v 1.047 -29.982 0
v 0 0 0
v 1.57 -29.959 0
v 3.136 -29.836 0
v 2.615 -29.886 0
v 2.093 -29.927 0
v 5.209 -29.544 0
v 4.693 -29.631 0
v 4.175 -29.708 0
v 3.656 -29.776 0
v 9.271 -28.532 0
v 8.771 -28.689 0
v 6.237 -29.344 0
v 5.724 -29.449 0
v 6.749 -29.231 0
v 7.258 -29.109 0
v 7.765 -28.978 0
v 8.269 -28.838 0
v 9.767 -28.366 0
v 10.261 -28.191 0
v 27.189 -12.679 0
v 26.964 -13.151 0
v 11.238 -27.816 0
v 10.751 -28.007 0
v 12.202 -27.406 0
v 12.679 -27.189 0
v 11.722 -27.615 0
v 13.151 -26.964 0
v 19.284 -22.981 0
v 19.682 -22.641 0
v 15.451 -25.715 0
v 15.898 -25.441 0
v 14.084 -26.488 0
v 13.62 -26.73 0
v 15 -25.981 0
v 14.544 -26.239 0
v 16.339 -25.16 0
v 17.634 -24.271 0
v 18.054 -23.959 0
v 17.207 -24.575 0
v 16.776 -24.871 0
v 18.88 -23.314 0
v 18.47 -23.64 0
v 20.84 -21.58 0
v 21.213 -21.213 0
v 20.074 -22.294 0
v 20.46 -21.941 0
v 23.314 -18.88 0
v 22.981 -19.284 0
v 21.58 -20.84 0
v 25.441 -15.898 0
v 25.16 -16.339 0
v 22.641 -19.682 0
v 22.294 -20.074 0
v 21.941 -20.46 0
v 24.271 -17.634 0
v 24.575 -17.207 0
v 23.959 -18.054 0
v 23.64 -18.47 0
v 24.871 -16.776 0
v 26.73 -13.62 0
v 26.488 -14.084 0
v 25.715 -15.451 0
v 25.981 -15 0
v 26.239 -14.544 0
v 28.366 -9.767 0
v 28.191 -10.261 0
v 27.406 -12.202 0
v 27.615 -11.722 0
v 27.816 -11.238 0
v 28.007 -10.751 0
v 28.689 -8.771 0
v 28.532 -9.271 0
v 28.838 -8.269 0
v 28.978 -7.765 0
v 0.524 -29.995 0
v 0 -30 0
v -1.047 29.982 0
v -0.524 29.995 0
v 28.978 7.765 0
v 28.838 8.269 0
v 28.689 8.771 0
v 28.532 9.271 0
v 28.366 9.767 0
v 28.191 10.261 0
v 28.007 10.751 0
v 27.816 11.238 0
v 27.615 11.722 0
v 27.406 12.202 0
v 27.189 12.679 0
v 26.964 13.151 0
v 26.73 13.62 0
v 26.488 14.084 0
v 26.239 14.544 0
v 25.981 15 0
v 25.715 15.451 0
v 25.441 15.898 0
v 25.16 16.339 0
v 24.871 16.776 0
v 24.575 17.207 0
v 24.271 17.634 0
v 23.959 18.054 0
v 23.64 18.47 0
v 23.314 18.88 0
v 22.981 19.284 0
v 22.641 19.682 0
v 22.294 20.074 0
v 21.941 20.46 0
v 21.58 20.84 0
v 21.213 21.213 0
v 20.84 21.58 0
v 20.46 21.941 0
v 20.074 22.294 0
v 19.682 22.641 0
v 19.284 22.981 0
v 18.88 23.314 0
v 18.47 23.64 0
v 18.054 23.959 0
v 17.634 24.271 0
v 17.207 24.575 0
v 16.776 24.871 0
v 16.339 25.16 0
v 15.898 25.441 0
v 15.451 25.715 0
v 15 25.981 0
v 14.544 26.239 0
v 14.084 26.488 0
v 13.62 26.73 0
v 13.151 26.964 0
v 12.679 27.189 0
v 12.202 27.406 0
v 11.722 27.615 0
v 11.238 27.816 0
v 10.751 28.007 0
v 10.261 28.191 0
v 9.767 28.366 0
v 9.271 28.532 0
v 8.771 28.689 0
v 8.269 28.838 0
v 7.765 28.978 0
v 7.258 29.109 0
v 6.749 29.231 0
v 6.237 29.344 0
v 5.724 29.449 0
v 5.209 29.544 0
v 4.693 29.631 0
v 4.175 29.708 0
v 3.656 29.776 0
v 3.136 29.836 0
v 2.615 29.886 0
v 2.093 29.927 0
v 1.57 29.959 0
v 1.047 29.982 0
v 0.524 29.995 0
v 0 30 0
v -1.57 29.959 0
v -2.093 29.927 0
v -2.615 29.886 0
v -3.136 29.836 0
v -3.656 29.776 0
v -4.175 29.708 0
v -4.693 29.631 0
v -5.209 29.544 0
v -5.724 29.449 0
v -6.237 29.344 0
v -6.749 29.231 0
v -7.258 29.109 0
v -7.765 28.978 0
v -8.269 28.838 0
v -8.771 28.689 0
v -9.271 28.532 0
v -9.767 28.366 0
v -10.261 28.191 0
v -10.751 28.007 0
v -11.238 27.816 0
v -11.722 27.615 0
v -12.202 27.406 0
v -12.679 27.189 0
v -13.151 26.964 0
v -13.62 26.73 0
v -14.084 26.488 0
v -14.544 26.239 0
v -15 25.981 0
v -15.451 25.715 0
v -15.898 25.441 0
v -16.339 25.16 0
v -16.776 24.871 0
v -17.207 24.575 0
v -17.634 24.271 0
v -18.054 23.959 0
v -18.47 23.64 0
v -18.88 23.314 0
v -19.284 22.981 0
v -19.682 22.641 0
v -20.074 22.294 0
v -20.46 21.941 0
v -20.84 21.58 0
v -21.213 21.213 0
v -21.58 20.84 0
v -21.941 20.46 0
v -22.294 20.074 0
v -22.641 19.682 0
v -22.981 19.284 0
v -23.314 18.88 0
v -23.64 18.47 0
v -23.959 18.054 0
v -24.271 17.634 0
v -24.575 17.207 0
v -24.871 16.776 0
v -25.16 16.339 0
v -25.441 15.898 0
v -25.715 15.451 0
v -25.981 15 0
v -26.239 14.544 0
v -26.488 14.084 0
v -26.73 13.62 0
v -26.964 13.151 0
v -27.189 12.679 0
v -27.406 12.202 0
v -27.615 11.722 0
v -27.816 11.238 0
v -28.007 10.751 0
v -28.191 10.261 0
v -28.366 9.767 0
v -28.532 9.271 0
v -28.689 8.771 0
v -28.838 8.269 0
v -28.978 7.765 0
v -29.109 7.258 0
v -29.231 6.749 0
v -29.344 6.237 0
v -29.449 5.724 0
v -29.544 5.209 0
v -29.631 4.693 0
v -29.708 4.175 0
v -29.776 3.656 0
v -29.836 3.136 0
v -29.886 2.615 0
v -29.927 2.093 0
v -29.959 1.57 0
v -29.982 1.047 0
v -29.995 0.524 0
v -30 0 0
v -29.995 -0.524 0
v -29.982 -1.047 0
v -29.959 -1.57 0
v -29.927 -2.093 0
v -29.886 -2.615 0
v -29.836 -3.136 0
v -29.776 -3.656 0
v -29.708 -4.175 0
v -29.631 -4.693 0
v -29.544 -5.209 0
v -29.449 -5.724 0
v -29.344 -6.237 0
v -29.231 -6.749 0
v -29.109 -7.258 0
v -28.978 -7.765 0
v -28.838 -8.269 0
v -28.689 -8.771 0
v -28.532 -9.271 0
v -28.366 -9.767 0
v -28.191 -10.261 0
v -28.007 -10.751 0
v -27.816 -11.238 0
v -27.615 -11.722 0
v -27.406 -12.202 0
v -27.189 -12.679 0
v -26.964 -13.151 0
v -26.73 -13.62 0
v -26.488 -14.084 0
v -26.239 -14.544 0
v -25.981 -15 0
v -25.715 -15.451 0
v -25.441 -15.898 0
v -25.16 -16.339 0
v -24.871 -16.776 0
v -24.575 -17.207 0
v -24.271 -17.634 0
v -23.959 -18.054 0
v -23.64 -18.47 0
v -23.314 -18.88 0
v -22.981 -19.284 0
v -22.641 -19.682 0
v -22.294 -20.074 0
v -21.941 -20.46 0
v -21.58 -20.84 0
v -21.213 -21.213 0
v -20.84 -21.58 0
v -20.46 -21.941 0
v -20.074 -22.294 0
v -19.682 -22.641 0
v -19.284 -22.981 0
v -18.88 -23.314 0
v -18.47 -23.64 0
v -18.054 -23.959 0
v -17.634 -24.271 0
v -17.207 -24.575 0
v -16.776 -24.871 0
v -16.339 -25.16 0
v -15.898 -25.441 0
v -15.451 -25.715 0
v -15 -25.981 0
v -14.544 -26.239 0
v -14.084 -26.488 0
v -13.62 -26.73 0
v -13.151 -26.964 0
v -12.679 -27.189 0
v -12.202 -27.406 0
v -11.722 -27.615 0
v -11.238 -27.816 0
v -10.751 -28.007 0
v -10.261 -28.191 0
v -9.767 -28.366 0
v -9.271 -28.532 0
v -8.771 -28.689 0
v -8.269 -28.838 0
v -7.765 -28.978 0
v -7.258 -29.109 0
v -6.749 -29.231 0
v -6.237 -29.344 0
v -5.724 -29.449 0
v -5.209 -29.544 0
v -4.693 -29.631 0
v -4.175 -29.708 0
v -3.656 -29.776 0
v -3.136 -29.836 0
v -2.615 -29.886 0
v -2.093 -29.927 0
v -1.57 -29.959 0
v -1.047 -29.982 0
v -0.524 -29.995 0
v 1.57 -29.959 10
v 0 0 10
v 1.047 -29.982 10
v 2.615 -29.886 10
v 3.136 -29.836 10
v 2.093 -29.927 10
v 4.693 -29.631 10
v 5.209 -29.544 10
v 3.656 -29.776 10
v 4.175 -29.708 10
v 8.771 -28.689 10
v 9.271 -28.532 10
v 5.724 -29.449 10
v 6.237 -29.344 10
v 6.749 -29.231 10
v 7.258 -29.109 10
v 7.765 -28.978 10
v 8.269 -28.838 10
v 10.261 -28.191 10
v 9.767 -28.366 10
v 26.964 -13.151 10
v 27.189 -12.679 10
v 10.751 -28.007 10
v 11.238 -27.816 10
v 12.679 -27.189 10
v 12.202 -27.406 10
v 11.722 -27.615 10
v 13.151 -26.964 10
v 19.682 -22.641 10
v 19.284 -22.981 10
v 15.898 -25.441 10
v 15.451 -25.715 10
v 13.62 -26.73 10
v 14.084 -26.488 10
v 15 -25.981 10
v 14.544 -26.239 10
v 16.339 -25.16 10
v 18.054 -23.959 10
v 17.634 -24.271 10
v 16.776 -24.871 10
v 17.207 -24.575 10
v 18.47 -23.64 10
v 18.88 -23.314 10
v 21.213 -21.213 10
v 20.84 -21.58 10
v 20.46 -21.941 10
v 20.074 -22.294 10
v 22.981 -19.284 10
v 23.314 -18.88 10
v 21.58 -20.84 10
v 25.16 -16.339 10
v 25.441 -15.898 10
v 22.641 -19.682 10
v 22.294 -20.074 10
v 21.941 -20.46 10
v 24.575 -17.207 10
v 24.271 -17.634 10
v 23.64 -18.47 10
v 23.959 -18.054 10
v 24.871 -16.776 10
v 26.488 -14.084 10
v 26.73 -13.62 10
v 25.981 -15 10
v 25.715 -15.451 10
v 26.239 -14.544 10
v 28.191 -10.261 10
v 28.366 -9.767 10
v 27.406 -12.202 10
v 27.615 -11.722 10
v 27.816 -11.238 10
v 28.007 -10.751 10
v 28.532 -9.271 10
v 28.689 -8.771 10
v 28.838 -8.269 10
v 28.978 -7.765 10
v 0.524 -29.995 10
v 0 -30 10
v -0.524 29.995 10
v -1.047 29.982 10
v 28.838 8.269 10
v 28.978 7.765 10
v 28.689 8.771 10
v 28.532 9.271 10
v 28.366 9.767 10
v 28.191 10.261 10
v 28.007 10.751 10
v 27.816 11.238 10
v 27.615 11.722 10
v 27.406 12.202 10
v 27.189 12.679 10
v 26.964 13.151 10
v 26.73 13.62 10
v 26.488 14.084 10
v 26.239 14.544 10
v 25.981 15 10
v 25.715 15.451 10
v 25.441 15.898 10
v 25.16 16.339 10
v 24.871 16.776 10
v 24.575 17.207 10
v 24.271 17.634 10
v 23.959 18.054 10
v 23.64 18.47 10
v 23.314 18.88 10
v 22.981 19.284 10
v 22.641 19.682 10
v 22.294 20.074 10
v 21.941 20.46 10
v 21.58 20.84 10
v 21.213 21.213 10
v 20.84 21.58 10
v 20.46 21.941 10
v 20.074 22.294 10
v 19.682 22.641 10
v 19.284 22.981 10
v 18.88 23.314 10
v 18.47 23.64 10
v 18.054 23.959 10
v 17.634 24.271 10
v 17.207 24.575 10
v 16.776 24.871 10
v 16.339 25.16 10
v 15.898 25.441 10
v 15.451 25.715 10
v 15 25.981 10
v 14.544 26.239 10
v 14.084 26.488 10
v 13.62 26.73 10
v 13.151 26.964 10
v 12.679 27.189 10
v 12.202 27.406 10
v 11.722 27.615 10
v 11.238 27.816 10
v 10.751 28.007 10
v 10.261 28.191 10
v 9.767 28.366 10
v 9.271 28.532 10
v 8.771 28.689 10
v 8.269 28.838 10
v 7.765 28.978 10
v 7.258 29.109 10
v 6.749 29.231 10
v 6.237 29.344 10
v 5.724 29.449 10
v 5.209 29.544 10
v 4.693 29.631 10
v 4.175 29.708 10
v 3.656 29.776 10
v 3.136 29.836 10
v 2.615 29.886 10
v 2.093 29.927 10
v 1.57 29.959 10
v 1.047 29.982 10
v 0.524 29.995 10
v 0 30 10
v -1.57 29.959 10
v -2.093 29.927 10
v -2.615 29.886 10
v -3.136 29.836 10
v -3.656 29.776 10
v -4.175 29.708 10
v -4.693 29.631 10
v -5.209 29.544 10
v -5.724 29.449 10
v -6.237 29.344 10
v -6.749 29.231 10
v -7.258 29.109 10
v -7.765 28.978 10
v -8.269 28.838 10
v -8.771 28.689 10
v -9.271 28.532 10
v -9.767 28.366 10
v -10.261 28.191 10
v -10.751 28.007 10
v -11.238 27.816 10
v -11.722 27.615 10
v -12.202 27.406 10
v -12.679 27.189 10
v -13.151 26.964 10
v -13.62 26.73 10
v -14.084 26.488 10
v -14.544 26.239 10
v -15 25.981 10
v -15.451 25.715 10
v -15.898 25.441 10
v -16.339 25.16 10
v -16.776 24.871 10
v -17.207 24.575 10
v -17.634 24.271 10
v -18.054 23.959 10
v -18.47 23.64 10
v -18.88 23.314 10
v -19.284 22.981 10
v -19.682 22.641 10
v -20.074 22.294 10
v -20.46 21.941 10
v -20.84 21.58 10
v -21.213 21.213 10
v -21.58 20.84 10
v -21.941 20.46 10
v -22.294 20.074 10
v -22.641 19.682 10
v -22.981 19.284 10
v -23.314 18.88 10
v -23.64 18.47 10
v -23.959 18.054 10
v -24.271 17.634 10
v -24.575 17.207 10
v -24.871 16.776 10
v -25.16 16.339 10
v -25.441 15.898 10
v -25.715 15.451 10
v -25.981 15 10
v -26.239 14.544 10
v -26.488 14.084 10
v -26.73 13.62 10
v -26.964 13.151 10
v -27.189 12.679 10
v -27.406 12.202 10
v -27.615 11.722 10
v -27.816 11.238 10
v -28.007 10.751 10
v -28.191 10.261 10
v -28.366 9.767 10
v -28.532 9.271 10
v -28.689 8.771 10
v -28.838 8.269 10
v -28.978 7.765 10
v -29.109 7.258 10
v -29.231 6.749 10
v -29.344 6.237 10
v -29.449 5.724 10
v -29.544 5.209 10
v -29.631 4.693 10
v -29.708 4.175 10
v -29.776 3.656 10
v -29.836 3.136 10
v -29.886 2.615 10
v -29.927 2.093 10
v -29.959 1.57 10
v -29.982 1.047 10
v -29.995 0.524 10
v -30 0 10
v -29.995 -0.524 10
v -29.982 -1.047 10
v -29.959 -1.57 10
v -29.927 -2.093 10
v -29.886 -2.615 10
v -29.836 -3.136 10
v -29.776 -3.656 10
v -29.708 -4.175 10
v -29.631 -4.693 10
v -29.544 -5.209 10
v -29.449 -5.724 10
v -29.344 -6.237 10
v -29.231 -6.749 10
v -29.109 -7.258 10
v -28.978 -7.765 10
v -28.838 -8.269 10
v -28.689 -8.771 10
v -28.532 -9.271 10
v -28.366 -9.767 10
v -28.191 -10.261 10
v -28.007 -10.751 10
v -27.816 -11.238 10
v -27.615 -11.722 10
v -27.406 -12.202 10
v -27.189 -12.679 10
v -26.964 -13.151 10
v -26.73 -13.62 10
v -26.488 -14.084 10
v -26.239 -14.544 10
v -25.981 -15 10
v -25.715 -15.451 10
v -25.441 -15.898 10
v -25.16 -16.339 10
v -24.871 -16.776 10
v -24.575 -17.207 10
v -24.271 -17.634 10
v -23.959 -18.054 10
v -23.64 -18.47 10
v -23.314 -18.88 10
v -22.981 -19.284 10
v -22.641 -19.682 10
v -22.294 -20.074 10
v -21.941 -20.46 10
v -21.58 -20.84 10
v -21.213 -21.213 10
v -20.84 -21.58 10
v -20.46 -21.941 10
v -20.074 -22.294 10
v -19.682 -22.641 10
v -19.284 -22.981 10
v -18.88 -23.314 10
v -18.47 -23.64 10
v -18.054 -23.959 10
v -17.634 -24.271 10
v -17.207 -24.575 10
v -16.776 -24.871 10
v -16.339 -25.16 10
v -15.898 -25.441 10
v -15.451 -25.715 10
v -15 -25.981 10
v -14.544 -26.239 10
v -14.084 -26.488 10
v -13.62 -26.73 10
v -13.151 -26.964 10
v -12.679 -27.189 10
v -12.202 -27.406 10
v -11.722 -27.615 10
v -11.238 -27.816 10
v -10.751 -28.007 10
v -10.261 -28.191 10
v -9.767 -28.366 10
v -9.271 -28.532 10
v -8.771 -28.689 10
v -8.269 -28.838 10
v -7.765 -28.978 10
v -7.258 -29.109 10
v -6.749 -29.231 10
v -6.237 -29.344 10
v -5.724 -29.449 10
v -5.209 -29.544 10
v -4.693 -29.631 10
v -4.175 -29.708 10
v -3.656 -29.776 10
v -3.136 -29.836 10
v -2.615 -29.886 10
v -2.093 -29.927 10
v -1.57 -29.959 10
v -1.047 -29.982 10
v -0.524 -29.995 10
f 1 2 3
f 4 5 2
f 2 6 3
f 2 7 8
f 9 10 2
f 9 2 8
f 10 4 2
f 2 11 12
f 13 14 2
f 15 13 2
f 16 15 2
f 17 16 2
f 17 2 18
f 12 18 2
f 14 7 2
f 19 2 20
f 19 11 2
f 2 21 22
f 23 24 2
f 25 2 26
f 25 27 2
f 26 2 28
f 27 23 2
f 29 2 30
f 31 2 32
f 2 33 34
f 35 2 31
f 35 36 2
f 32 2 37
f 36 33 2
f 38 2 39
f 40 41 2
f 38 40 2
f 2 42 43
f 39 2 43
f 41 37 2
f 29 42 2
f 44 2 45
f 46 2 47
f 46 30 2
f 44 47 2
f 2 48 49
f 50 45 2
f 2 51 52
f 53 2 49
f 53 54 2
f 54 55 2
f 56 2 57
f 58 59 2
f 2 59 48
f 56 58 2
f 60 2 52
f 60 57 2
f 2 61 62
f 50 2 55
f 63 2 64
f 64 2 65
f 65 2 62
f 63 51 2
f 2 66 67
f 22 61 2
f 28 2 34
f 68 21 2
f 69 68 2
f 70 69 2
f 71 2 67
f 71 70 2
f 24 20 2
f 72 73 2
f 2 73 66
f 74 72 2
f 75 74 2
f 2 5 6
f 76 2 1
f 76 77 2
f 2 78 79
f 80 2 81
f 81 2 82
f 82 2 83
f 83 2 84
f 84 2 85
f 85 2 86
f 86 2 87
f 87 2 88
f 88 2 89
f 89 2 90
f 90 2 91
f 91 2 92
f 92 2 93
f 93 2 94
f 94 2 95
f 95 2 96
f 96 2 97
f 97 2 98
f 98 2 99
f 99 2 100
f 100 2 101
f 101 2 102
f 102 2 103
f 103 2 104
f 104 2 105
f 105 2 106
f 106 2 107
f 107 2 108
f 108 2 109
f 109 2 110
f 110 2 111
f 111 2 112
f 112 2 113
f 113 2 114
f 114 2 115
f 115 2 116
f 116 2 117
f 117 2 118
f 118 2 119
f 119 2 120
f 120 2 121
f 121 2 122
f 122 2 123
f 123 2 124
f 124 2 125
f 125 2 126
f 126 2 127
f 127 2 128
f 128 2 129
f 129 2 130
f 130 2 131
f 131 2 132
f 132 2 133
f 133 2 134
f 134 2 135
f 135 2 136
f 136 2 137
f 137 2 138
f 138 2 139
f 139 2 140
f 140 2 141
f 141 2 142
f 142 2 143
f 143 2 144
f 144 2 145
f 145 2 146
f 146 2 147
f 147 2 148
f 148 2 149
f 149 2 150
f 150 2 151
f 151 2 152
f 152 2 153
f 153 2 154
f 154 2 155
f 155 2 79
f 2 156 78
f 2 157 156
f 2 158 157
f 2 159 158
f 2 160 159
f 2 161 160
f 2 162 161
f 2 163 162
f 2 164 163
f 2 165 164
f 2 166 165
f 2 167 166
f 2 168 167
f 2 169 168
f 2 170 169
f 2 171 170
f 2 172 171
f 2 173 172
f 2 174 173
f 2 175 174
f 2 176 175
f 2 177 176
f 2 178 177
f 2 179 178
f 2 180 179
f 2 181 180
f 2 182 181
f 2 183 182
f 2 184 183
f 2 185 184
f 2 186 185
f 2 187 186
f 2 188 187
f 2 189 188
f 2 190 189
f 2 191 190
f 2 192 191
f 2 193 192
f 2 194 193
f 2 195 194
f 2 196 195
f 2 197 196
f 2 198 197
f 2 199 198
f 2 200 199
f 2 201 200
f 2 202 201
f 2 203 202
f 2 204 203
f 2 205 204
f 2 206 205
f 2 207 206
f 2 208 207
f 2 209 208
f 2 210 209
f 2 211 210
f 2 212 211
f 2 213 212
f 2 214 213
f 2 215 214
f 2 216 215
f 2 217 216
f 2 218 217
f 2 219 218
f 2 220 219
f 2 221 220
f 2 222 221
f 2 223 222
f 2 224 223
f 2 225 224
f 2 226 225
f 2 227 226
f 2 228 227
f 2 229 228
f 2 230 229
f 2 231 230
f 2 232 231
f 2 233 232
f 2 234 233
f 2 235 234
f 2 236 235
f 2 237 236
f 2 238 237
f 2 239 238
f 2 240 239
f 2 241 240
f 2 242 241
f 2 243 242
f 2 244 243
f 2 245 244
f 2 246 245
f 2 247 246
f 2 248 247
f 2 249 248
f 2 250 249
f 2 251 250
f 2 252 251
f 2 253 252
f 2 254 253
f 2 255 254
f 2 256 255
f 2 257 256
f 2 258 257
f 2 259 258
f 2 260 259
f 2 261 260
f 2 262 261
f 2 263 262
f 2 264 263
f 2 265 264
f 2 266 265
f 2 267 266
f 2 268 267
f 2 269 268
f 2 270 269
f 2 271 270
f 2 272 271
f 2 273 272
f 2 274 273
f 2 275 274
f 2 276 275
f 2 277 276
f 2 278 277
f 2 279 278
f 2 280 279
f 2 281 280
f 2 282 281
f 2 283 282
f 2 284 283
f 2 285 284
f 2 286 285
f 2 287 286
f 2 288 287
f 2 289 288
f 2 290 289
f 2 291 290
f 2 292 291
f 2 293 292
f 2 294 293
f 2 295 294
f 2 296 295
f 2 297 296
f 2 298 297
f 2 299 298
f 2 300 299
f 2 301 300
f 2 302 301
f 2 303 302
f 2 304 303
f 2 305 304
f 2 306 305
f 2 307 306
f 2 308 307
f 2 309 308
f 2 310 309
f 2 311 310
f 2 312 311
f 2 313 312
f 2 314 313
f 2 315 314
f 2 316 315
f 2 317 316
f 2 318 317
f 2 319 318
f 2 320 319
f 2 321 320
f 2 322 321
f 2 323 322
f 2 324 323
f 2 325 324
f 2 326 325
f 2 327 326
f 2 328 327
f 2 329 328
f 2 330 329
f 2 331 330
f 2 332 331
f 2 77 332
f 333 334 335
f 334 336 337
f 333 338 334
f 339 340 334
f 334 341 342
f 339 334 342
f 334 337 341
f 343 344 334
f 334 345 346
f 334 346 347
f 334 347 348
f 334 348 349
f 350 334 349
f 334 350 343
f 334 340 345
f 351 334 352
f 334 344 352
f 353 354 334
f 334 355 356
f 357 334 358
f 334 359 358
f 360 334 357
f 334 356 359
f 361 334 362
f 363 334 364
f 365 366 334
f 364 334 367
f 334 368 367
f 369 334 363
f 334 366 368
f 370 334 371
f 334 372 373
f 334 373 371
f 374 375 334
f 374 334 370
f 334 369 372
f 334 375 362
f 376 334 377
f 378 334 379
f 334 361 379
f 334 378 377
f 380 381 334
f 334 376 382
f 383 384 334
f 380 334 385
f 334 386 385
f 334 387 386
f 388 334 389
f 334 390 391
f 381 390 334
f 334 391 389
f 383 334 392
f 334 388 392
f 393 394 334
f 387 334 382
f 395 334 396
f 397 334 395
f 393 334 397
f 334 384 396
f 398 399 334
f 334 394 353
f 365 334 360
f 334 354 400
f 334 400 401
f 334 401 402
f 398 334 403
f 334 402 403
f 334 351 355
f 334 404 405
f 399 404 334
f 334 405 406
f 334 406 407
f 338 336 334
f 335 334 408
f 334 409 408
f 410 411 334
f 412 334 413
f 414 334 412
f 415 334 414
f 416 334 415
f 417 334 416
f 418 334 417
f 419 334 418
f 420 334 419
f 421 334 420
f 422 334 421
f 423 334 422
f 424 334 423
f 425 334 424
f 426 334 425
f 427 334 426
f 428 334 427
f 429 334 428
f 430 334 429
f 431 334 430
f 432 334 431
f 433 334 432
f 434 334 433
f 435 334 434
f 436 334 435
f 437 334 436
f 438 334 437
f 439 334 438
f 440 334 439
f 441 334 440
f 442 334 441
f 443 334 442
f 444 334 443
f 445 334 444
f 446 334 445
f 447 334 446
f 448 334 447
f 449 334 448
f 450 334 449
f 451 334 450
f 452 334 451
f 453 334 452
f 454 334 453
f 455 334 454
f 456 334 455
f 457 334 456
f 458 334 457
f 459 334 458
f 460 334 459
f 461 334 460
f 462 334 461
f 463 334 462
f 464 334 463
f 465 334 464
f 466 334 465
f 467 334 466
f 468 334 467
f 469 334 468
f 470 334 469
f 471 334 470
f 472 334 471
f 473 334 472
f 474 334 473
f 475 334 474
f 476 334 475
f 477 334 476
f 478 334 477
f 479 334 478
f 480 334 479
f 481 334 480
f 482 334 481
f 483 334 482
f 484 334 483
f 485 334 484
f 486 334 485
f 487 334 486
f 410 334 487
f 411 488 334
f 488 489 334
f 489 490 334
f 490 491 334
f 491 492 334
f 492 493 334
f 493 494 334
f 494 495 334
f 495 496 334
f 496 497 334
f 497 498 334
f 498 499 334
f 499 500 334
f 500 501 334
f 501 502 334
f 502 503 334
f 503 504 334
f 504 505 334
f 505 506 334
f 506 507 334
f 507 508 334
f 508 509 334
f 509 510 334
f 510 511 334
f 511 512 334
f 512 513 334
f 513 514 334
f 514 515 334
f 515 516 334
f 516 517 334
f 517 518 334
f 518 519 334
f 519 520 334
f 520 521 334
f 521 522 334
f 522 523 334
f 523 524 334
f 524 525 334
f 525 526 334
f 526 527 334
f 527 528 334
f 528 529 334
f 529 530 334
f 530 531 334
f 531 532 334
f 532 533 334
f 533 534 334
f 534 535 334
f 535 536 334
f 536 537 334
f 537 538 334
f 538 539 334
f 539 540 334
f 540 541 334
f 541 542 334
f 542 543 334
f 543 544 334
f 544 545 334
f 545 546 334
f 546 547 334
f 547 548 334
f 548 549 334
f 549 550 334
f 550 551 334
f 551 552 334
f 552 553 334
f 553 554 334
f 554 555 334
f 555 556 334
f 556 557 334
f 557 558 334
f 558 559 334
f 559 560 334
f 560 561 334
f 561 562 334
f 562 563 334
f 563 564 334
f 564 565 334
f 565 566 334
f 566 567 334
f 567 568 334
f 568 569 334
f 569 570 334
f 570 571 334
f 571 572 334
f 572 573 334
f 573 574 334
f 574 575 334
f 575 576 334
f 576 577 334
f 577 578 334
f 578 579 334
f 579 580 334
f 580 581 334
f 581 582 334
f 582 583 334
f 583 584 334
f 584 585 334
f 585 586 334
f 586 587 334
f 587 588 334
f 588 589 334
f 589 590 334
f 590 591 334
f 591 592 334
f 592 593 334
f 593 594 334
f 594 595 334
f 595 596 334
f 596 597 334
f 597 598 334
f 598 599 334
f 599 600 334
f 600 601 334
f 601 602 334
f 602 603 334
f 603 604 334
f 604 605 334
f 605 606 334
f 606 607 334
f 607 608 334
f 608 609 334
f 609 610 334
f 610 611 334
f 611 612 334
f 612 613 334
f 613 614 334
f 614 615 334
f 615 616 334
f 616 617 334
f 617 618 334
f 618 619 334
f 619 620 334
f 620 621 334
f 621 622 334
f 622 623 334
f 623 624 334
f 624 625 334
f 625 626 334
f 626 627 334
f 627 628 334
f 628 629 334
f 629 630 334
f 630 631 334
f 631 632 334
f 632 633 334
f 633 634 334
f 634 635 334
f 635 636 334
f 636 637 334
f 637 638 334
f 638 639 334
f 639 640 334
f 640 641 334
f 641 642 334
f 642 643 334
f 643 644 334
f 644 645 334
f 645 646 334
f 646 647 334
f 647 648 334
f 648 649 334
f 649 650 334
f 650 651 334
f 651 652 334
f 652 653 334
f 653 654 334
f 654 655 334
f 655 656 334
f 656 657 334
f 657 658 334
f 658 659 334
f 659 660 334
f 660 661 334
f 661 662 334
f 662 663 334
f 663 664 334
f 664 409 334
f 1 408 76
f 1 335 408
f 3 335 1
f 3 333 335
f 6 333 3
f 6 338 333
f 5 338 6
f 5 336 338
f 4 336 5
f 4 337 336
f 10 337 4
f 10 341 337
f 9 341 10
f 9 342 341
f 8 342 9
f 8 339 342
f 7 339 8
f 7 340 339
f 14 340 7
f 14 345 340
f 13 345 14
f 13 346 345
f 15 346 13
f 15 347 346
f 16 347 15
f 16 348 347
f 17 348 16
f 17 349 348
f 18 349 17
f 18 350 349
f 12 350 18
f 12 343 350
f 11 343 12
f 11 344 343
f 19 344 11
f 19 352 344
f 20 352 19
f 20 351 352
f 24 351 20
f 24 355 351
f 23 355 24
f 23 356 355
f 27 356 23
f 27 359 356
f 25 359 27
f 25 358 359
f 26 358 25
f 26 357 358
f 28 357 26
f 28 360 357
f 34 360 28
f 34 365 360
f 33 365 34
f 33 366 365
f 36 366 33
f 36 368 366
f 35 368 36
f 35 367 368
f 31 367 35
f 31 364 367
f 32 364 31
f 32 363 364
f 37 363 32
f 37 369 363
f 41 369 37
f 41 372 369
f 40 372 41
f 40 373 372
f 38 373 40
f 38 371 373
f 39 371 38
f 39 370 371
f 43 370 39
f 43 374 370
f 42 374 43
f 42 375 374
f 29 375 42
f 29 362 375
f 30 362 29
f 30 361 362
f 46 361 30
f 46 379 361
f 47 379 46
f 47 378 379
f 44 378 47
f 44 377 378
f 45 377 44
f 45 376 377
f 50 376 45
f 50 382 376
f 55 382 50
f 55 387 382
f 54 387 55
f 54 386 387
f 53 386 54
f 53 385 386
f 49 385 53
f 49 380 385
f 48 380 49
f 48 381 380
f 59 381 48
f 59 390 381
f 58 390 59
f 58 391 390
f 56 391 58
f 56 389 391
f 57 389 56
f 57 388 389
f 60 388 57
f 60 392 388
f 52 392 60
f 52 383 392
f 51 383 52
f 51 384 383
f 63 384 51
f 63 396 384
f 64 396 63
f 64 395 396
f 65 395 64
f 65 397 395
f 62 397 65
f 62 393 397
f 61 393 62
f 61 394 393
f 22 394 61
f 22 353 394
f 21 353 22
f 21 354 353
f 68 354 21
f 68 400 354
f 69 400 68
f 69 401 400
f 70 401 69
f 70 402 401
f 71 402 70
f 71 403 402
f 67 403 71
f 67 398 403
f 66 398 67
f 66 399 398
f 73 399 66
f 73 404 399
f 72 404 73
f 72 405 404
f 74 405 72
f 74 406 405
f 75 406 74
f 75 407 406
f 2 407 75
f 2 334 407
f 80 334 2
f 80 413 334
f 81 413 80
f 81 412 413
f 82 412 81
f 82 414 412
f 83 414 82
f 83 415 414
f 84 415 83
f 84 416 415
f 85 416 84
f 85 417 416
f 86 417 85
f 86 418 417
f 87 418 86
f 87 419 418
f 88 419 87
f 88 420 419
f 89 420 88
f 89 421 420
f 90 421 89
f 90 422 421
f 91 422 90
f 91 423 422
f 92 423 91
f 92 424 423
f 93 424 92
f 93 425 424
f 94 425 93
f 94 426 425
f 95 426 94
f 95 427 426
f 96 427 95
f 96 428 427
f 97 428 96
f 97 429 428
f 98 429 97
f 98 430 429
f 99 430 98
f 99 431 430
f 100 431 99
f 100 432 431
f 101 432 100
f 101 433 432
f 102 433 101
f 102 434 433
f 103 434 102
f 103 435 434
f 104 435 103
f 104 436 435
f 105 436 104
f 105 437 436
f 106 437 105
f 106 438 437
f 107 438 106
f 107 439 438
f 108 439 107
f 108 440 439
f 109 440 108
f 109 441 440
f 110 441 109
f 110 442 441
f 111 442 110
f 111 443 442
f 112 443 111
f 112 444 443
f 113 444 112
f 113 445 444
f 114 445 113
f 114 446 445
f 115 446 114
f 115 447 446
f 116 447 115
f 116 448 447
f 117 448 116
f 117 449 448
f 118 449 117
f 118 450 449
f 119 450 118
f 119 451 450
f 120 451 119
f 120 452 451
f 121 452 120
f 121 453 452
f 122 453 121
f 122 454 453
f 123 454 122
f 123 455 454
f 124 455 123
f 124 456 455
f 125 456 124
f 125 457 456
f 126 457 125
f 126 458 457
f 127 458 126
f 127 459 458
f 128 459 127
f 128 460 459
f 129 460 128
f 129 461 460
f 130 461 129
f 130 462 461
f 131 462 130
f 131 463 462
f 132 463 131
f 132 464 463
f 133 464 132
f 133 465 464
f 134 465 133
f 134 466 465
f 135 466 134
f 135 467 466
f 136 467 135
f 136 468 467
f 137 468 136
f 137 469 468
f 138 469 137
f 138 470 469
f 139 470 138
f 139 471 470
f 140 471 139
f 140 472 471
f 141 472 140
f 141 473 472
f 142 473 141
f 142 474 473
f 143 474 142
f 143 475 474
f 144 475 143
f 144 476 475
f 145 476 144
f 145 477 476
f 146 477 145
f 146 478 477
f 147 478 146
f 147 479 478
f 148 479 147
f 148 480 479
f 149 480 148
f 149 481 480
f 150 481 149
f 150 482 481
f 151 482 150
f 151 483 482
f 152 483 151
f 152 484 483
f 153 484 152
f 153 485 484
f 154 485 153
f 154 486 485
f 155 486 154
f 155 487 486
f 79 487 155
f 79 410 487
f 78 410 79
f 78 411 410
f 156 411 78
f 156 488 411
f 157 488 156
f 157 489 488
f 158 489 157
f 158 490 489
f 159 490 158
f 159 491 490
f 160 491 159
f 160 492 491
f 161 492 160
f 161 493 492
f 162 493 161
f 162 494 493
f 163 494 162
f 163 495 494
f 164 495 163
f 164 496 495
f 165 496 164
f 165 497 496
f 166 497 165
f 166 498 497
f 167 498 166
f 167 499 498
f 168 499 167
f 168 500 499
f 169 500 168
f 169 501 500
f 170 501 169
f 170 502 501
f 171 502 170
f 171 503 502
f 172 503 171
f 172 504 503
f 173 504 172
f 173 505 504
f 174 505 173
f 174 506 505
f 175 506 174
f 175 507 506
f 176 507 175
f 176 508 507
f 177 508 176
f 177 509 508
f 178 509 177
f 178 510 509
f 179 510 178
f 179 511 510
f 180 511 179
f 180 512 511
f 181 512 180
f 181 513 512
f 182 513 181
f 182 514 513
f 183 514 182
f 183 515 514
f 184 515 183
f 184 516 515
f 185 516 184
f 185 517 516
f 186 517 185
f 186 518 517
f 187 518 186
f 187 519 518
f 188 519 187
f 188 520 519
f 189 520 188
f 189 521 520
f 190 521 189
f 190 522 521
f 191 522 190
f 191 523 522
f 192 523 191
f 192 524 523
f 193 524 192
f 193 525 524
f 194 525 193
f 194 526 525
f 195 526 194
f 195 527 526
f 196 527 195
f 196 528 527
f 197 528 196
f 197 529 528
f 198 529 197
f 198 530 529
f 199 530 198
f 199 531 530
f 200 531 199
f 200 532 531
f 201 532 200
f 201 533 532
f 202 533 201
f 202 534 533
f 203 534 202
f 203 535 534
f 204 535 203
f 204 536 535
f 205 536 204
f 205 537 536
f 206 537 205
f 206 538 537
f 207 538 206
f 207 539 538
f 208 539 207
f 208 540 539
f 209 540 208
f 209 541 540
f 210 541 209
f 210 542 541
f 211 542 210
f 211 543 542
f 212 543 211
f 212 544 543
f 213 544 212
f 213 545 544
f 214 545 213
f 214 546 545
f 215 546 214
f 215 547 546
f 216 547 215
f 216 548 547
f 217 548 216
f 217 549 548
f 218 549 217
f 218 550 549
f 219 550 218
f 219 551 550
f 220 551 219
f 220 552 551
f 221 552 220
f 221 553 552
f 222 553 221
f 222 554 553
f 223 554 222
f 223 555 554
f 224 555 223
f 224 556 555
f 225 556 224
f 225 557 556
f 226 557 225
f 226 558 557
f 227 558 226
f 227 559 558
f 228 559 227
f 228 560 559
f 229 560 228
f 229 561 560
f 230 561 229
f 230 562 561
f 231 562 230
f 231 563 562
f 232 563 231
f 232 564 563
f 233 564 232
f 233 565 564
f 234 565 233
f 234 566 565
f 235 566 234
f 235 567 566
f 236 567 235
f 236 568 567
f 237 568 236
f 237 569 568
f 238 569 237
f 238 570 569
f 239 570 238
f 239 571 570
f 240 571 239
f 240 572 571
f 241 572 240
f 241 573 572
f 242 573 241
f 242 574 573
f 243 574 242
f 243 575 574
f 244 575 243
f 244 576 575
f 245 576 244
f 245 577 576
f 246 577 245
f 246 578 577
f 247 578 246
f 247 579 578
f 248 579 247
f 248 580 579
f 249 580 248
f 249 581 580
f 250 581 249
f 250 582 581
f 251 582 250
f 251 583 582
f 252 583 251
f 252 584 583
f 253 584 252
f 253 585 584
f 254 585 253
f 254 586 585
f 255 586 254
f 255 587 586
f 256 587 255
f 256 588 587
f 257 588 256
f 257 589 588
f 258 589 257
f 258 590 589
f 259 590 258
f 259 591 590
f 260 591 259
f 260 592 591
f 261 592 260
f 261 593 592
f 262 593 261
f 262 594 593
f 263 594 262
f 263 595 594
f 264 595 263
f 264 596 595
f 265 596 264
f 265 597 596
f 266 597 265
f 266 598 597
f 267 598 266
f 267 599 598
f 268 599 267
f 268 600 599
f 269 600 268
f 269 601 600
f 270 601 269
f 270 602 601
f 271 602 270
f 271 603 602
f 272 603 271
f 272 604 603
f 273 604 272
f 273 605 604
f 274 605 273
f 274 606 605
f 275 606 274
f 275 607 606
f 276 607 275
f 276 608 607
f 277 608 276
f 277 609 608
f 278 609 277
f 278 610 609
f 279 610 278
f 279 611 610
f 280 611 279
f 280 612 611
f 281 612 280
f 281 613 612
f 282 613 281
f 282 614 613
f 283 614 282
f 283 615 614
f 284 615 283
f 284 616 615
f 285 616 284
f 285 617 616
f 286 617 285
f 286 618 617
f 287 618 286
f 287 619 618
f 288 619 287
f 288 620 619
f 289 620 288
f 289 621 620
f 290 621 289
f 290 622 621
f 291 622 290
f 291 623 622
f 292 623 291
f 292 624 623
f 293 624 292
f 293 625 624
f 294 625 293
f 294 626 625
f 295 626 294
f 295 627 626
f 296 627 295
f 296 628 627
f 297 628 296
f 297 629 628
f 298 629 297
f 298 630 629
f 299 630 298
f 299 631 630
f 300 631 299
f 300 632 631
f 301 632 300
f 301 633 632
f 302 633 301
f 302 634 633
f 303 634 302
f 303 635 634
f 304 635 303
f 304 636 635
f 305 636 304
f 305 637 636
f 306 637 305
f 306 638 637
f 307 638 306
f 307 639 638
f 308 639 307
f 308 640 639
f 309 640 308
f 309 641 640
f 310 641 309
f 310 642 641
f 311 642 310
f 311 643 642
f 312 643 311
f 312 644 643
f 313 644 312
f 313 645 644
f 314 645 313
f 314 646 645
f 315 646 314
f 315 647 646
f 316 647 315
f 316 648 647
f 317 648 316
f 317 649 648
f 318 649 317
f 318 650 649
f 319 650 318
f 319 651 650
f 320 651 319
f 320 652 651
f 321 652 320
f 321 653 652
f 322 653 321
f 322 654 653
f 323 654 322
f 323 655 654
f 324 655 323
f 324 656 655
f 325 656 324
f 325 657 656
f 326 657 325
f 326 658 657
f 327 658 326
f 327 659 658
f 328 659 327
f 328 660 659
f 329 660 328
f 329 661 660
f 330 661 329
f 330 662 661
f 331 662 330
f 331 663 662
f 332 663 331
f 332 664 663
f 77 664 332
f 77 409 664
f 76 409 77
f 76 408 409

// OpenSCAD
// Unit of length: Unit.INCH
linear_extrude(height = 10.0, center = false, convexity = 2, twist = 0.0, scale = 1.0)
{
   intersection()
   {
      circle(d = 60.0, $fn = 360);
      polygon(points = [[0.0, 0.0], [33.4718, 8.9687], [0.0, 42.4405], [-42.4405, 0.0], [0.0, -42.4405], [33.4718, -8.9687]], convexity = 2);
   }
}
